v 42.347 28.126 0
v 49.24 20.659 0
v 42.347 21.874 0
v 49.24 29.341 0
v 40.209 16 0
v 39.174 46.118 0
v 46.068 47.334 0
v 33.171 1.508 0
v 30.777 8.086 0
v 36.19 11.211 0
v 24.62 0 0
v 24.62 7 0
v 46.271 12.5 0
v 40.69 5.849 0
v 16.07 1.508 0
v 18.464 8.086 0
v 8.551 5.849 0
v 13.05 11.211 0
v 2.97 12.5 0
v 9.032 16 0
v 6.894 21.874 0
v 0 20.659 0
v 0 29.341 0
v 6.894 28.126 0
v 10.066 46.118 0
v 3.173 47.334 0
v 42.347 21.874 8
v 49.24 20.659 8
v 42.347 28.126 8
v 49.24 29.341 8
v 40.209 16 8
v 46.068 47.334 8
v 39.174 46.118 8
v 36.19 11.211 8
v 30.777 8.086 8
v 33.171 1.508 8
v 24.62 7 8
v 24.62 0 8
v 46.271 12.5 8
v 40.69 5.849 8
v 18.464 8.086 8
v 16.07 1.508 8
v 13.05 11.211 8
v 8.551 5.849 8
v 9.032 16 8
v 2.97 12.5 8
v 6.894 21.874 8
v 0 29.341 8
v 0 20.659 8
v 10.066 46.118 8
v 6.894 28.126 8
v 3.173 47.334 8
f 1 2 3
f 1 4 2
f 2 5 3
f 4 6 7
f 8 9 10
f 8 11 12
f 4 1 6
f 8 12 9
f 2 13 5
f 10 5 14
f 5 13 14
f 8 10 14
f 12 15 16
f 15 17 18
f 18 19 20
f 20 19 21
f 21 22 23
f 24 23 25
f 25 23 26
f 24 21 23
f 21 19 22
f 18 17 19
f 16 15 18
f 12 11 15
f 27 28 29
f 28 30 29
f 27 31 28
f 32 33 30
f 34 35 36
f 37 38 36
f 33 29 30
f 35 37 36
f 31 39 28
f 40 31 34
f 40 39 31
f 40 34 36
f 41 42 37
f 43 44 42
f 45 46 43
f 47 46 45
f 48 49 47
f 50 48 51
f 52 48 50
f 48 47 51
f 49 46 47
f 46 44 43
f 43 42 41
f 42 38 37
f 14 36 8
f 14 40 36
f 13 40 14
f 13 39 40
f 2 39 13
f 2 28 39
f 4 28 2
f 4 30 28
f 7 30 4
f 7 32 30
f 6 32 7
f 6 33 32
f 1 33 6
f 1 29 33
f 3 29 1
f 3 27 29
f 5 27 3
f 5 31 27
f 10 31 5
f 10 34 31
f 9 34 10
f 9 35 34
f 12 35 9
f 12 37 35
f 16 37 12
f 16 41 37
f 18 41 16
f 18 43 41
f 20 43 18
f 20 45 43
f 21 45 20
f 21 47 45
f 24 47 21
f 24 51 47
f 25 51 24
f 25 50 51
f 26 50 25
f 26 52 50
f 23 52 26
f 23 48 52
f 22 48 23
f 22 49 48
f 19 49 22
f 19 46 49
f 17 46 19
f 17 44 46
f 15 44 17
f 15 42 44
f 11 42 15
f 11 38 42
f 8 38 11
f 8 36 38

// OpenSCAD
$fn = 32;

// ----------------------------------------------------------------------
// Clip blank: omega clip, 8 mm thick
// ----------------------------------------------------------------------

// --- parameters (mm) ---
profile_height = 8;       // extrusion height
profile_points = 26;      // points of the closed outline

profile = [[0, 29.341], [0, 20.659], [2.97, 12.5], [8.551, 5.849], [16.07, 1.508], [24.62, 0], [33.171, 1.508], [40.69, 5.849], [46.271, 12.5], [49.24, 20.659], [49.24, 29.341], [46.068, 47.334], [39.174, 46.118], [42.347, 28.126], [42.347, 21.874], [40.209, 16], [36.19, 11.211], [30.777, 8.086], [24.62, 7], [18.464, 8.086], [13.05, 11.211], [9.032, 16], [6.894, 21.874], [6.894, 28.126], [10.066, 46.118], [3.173, 47.334]];  // single closed polygon, 26 points, counter clockwise

// --- the one profile operation ---
linear_extrude(height = profile_height) polygon(points = profile);
